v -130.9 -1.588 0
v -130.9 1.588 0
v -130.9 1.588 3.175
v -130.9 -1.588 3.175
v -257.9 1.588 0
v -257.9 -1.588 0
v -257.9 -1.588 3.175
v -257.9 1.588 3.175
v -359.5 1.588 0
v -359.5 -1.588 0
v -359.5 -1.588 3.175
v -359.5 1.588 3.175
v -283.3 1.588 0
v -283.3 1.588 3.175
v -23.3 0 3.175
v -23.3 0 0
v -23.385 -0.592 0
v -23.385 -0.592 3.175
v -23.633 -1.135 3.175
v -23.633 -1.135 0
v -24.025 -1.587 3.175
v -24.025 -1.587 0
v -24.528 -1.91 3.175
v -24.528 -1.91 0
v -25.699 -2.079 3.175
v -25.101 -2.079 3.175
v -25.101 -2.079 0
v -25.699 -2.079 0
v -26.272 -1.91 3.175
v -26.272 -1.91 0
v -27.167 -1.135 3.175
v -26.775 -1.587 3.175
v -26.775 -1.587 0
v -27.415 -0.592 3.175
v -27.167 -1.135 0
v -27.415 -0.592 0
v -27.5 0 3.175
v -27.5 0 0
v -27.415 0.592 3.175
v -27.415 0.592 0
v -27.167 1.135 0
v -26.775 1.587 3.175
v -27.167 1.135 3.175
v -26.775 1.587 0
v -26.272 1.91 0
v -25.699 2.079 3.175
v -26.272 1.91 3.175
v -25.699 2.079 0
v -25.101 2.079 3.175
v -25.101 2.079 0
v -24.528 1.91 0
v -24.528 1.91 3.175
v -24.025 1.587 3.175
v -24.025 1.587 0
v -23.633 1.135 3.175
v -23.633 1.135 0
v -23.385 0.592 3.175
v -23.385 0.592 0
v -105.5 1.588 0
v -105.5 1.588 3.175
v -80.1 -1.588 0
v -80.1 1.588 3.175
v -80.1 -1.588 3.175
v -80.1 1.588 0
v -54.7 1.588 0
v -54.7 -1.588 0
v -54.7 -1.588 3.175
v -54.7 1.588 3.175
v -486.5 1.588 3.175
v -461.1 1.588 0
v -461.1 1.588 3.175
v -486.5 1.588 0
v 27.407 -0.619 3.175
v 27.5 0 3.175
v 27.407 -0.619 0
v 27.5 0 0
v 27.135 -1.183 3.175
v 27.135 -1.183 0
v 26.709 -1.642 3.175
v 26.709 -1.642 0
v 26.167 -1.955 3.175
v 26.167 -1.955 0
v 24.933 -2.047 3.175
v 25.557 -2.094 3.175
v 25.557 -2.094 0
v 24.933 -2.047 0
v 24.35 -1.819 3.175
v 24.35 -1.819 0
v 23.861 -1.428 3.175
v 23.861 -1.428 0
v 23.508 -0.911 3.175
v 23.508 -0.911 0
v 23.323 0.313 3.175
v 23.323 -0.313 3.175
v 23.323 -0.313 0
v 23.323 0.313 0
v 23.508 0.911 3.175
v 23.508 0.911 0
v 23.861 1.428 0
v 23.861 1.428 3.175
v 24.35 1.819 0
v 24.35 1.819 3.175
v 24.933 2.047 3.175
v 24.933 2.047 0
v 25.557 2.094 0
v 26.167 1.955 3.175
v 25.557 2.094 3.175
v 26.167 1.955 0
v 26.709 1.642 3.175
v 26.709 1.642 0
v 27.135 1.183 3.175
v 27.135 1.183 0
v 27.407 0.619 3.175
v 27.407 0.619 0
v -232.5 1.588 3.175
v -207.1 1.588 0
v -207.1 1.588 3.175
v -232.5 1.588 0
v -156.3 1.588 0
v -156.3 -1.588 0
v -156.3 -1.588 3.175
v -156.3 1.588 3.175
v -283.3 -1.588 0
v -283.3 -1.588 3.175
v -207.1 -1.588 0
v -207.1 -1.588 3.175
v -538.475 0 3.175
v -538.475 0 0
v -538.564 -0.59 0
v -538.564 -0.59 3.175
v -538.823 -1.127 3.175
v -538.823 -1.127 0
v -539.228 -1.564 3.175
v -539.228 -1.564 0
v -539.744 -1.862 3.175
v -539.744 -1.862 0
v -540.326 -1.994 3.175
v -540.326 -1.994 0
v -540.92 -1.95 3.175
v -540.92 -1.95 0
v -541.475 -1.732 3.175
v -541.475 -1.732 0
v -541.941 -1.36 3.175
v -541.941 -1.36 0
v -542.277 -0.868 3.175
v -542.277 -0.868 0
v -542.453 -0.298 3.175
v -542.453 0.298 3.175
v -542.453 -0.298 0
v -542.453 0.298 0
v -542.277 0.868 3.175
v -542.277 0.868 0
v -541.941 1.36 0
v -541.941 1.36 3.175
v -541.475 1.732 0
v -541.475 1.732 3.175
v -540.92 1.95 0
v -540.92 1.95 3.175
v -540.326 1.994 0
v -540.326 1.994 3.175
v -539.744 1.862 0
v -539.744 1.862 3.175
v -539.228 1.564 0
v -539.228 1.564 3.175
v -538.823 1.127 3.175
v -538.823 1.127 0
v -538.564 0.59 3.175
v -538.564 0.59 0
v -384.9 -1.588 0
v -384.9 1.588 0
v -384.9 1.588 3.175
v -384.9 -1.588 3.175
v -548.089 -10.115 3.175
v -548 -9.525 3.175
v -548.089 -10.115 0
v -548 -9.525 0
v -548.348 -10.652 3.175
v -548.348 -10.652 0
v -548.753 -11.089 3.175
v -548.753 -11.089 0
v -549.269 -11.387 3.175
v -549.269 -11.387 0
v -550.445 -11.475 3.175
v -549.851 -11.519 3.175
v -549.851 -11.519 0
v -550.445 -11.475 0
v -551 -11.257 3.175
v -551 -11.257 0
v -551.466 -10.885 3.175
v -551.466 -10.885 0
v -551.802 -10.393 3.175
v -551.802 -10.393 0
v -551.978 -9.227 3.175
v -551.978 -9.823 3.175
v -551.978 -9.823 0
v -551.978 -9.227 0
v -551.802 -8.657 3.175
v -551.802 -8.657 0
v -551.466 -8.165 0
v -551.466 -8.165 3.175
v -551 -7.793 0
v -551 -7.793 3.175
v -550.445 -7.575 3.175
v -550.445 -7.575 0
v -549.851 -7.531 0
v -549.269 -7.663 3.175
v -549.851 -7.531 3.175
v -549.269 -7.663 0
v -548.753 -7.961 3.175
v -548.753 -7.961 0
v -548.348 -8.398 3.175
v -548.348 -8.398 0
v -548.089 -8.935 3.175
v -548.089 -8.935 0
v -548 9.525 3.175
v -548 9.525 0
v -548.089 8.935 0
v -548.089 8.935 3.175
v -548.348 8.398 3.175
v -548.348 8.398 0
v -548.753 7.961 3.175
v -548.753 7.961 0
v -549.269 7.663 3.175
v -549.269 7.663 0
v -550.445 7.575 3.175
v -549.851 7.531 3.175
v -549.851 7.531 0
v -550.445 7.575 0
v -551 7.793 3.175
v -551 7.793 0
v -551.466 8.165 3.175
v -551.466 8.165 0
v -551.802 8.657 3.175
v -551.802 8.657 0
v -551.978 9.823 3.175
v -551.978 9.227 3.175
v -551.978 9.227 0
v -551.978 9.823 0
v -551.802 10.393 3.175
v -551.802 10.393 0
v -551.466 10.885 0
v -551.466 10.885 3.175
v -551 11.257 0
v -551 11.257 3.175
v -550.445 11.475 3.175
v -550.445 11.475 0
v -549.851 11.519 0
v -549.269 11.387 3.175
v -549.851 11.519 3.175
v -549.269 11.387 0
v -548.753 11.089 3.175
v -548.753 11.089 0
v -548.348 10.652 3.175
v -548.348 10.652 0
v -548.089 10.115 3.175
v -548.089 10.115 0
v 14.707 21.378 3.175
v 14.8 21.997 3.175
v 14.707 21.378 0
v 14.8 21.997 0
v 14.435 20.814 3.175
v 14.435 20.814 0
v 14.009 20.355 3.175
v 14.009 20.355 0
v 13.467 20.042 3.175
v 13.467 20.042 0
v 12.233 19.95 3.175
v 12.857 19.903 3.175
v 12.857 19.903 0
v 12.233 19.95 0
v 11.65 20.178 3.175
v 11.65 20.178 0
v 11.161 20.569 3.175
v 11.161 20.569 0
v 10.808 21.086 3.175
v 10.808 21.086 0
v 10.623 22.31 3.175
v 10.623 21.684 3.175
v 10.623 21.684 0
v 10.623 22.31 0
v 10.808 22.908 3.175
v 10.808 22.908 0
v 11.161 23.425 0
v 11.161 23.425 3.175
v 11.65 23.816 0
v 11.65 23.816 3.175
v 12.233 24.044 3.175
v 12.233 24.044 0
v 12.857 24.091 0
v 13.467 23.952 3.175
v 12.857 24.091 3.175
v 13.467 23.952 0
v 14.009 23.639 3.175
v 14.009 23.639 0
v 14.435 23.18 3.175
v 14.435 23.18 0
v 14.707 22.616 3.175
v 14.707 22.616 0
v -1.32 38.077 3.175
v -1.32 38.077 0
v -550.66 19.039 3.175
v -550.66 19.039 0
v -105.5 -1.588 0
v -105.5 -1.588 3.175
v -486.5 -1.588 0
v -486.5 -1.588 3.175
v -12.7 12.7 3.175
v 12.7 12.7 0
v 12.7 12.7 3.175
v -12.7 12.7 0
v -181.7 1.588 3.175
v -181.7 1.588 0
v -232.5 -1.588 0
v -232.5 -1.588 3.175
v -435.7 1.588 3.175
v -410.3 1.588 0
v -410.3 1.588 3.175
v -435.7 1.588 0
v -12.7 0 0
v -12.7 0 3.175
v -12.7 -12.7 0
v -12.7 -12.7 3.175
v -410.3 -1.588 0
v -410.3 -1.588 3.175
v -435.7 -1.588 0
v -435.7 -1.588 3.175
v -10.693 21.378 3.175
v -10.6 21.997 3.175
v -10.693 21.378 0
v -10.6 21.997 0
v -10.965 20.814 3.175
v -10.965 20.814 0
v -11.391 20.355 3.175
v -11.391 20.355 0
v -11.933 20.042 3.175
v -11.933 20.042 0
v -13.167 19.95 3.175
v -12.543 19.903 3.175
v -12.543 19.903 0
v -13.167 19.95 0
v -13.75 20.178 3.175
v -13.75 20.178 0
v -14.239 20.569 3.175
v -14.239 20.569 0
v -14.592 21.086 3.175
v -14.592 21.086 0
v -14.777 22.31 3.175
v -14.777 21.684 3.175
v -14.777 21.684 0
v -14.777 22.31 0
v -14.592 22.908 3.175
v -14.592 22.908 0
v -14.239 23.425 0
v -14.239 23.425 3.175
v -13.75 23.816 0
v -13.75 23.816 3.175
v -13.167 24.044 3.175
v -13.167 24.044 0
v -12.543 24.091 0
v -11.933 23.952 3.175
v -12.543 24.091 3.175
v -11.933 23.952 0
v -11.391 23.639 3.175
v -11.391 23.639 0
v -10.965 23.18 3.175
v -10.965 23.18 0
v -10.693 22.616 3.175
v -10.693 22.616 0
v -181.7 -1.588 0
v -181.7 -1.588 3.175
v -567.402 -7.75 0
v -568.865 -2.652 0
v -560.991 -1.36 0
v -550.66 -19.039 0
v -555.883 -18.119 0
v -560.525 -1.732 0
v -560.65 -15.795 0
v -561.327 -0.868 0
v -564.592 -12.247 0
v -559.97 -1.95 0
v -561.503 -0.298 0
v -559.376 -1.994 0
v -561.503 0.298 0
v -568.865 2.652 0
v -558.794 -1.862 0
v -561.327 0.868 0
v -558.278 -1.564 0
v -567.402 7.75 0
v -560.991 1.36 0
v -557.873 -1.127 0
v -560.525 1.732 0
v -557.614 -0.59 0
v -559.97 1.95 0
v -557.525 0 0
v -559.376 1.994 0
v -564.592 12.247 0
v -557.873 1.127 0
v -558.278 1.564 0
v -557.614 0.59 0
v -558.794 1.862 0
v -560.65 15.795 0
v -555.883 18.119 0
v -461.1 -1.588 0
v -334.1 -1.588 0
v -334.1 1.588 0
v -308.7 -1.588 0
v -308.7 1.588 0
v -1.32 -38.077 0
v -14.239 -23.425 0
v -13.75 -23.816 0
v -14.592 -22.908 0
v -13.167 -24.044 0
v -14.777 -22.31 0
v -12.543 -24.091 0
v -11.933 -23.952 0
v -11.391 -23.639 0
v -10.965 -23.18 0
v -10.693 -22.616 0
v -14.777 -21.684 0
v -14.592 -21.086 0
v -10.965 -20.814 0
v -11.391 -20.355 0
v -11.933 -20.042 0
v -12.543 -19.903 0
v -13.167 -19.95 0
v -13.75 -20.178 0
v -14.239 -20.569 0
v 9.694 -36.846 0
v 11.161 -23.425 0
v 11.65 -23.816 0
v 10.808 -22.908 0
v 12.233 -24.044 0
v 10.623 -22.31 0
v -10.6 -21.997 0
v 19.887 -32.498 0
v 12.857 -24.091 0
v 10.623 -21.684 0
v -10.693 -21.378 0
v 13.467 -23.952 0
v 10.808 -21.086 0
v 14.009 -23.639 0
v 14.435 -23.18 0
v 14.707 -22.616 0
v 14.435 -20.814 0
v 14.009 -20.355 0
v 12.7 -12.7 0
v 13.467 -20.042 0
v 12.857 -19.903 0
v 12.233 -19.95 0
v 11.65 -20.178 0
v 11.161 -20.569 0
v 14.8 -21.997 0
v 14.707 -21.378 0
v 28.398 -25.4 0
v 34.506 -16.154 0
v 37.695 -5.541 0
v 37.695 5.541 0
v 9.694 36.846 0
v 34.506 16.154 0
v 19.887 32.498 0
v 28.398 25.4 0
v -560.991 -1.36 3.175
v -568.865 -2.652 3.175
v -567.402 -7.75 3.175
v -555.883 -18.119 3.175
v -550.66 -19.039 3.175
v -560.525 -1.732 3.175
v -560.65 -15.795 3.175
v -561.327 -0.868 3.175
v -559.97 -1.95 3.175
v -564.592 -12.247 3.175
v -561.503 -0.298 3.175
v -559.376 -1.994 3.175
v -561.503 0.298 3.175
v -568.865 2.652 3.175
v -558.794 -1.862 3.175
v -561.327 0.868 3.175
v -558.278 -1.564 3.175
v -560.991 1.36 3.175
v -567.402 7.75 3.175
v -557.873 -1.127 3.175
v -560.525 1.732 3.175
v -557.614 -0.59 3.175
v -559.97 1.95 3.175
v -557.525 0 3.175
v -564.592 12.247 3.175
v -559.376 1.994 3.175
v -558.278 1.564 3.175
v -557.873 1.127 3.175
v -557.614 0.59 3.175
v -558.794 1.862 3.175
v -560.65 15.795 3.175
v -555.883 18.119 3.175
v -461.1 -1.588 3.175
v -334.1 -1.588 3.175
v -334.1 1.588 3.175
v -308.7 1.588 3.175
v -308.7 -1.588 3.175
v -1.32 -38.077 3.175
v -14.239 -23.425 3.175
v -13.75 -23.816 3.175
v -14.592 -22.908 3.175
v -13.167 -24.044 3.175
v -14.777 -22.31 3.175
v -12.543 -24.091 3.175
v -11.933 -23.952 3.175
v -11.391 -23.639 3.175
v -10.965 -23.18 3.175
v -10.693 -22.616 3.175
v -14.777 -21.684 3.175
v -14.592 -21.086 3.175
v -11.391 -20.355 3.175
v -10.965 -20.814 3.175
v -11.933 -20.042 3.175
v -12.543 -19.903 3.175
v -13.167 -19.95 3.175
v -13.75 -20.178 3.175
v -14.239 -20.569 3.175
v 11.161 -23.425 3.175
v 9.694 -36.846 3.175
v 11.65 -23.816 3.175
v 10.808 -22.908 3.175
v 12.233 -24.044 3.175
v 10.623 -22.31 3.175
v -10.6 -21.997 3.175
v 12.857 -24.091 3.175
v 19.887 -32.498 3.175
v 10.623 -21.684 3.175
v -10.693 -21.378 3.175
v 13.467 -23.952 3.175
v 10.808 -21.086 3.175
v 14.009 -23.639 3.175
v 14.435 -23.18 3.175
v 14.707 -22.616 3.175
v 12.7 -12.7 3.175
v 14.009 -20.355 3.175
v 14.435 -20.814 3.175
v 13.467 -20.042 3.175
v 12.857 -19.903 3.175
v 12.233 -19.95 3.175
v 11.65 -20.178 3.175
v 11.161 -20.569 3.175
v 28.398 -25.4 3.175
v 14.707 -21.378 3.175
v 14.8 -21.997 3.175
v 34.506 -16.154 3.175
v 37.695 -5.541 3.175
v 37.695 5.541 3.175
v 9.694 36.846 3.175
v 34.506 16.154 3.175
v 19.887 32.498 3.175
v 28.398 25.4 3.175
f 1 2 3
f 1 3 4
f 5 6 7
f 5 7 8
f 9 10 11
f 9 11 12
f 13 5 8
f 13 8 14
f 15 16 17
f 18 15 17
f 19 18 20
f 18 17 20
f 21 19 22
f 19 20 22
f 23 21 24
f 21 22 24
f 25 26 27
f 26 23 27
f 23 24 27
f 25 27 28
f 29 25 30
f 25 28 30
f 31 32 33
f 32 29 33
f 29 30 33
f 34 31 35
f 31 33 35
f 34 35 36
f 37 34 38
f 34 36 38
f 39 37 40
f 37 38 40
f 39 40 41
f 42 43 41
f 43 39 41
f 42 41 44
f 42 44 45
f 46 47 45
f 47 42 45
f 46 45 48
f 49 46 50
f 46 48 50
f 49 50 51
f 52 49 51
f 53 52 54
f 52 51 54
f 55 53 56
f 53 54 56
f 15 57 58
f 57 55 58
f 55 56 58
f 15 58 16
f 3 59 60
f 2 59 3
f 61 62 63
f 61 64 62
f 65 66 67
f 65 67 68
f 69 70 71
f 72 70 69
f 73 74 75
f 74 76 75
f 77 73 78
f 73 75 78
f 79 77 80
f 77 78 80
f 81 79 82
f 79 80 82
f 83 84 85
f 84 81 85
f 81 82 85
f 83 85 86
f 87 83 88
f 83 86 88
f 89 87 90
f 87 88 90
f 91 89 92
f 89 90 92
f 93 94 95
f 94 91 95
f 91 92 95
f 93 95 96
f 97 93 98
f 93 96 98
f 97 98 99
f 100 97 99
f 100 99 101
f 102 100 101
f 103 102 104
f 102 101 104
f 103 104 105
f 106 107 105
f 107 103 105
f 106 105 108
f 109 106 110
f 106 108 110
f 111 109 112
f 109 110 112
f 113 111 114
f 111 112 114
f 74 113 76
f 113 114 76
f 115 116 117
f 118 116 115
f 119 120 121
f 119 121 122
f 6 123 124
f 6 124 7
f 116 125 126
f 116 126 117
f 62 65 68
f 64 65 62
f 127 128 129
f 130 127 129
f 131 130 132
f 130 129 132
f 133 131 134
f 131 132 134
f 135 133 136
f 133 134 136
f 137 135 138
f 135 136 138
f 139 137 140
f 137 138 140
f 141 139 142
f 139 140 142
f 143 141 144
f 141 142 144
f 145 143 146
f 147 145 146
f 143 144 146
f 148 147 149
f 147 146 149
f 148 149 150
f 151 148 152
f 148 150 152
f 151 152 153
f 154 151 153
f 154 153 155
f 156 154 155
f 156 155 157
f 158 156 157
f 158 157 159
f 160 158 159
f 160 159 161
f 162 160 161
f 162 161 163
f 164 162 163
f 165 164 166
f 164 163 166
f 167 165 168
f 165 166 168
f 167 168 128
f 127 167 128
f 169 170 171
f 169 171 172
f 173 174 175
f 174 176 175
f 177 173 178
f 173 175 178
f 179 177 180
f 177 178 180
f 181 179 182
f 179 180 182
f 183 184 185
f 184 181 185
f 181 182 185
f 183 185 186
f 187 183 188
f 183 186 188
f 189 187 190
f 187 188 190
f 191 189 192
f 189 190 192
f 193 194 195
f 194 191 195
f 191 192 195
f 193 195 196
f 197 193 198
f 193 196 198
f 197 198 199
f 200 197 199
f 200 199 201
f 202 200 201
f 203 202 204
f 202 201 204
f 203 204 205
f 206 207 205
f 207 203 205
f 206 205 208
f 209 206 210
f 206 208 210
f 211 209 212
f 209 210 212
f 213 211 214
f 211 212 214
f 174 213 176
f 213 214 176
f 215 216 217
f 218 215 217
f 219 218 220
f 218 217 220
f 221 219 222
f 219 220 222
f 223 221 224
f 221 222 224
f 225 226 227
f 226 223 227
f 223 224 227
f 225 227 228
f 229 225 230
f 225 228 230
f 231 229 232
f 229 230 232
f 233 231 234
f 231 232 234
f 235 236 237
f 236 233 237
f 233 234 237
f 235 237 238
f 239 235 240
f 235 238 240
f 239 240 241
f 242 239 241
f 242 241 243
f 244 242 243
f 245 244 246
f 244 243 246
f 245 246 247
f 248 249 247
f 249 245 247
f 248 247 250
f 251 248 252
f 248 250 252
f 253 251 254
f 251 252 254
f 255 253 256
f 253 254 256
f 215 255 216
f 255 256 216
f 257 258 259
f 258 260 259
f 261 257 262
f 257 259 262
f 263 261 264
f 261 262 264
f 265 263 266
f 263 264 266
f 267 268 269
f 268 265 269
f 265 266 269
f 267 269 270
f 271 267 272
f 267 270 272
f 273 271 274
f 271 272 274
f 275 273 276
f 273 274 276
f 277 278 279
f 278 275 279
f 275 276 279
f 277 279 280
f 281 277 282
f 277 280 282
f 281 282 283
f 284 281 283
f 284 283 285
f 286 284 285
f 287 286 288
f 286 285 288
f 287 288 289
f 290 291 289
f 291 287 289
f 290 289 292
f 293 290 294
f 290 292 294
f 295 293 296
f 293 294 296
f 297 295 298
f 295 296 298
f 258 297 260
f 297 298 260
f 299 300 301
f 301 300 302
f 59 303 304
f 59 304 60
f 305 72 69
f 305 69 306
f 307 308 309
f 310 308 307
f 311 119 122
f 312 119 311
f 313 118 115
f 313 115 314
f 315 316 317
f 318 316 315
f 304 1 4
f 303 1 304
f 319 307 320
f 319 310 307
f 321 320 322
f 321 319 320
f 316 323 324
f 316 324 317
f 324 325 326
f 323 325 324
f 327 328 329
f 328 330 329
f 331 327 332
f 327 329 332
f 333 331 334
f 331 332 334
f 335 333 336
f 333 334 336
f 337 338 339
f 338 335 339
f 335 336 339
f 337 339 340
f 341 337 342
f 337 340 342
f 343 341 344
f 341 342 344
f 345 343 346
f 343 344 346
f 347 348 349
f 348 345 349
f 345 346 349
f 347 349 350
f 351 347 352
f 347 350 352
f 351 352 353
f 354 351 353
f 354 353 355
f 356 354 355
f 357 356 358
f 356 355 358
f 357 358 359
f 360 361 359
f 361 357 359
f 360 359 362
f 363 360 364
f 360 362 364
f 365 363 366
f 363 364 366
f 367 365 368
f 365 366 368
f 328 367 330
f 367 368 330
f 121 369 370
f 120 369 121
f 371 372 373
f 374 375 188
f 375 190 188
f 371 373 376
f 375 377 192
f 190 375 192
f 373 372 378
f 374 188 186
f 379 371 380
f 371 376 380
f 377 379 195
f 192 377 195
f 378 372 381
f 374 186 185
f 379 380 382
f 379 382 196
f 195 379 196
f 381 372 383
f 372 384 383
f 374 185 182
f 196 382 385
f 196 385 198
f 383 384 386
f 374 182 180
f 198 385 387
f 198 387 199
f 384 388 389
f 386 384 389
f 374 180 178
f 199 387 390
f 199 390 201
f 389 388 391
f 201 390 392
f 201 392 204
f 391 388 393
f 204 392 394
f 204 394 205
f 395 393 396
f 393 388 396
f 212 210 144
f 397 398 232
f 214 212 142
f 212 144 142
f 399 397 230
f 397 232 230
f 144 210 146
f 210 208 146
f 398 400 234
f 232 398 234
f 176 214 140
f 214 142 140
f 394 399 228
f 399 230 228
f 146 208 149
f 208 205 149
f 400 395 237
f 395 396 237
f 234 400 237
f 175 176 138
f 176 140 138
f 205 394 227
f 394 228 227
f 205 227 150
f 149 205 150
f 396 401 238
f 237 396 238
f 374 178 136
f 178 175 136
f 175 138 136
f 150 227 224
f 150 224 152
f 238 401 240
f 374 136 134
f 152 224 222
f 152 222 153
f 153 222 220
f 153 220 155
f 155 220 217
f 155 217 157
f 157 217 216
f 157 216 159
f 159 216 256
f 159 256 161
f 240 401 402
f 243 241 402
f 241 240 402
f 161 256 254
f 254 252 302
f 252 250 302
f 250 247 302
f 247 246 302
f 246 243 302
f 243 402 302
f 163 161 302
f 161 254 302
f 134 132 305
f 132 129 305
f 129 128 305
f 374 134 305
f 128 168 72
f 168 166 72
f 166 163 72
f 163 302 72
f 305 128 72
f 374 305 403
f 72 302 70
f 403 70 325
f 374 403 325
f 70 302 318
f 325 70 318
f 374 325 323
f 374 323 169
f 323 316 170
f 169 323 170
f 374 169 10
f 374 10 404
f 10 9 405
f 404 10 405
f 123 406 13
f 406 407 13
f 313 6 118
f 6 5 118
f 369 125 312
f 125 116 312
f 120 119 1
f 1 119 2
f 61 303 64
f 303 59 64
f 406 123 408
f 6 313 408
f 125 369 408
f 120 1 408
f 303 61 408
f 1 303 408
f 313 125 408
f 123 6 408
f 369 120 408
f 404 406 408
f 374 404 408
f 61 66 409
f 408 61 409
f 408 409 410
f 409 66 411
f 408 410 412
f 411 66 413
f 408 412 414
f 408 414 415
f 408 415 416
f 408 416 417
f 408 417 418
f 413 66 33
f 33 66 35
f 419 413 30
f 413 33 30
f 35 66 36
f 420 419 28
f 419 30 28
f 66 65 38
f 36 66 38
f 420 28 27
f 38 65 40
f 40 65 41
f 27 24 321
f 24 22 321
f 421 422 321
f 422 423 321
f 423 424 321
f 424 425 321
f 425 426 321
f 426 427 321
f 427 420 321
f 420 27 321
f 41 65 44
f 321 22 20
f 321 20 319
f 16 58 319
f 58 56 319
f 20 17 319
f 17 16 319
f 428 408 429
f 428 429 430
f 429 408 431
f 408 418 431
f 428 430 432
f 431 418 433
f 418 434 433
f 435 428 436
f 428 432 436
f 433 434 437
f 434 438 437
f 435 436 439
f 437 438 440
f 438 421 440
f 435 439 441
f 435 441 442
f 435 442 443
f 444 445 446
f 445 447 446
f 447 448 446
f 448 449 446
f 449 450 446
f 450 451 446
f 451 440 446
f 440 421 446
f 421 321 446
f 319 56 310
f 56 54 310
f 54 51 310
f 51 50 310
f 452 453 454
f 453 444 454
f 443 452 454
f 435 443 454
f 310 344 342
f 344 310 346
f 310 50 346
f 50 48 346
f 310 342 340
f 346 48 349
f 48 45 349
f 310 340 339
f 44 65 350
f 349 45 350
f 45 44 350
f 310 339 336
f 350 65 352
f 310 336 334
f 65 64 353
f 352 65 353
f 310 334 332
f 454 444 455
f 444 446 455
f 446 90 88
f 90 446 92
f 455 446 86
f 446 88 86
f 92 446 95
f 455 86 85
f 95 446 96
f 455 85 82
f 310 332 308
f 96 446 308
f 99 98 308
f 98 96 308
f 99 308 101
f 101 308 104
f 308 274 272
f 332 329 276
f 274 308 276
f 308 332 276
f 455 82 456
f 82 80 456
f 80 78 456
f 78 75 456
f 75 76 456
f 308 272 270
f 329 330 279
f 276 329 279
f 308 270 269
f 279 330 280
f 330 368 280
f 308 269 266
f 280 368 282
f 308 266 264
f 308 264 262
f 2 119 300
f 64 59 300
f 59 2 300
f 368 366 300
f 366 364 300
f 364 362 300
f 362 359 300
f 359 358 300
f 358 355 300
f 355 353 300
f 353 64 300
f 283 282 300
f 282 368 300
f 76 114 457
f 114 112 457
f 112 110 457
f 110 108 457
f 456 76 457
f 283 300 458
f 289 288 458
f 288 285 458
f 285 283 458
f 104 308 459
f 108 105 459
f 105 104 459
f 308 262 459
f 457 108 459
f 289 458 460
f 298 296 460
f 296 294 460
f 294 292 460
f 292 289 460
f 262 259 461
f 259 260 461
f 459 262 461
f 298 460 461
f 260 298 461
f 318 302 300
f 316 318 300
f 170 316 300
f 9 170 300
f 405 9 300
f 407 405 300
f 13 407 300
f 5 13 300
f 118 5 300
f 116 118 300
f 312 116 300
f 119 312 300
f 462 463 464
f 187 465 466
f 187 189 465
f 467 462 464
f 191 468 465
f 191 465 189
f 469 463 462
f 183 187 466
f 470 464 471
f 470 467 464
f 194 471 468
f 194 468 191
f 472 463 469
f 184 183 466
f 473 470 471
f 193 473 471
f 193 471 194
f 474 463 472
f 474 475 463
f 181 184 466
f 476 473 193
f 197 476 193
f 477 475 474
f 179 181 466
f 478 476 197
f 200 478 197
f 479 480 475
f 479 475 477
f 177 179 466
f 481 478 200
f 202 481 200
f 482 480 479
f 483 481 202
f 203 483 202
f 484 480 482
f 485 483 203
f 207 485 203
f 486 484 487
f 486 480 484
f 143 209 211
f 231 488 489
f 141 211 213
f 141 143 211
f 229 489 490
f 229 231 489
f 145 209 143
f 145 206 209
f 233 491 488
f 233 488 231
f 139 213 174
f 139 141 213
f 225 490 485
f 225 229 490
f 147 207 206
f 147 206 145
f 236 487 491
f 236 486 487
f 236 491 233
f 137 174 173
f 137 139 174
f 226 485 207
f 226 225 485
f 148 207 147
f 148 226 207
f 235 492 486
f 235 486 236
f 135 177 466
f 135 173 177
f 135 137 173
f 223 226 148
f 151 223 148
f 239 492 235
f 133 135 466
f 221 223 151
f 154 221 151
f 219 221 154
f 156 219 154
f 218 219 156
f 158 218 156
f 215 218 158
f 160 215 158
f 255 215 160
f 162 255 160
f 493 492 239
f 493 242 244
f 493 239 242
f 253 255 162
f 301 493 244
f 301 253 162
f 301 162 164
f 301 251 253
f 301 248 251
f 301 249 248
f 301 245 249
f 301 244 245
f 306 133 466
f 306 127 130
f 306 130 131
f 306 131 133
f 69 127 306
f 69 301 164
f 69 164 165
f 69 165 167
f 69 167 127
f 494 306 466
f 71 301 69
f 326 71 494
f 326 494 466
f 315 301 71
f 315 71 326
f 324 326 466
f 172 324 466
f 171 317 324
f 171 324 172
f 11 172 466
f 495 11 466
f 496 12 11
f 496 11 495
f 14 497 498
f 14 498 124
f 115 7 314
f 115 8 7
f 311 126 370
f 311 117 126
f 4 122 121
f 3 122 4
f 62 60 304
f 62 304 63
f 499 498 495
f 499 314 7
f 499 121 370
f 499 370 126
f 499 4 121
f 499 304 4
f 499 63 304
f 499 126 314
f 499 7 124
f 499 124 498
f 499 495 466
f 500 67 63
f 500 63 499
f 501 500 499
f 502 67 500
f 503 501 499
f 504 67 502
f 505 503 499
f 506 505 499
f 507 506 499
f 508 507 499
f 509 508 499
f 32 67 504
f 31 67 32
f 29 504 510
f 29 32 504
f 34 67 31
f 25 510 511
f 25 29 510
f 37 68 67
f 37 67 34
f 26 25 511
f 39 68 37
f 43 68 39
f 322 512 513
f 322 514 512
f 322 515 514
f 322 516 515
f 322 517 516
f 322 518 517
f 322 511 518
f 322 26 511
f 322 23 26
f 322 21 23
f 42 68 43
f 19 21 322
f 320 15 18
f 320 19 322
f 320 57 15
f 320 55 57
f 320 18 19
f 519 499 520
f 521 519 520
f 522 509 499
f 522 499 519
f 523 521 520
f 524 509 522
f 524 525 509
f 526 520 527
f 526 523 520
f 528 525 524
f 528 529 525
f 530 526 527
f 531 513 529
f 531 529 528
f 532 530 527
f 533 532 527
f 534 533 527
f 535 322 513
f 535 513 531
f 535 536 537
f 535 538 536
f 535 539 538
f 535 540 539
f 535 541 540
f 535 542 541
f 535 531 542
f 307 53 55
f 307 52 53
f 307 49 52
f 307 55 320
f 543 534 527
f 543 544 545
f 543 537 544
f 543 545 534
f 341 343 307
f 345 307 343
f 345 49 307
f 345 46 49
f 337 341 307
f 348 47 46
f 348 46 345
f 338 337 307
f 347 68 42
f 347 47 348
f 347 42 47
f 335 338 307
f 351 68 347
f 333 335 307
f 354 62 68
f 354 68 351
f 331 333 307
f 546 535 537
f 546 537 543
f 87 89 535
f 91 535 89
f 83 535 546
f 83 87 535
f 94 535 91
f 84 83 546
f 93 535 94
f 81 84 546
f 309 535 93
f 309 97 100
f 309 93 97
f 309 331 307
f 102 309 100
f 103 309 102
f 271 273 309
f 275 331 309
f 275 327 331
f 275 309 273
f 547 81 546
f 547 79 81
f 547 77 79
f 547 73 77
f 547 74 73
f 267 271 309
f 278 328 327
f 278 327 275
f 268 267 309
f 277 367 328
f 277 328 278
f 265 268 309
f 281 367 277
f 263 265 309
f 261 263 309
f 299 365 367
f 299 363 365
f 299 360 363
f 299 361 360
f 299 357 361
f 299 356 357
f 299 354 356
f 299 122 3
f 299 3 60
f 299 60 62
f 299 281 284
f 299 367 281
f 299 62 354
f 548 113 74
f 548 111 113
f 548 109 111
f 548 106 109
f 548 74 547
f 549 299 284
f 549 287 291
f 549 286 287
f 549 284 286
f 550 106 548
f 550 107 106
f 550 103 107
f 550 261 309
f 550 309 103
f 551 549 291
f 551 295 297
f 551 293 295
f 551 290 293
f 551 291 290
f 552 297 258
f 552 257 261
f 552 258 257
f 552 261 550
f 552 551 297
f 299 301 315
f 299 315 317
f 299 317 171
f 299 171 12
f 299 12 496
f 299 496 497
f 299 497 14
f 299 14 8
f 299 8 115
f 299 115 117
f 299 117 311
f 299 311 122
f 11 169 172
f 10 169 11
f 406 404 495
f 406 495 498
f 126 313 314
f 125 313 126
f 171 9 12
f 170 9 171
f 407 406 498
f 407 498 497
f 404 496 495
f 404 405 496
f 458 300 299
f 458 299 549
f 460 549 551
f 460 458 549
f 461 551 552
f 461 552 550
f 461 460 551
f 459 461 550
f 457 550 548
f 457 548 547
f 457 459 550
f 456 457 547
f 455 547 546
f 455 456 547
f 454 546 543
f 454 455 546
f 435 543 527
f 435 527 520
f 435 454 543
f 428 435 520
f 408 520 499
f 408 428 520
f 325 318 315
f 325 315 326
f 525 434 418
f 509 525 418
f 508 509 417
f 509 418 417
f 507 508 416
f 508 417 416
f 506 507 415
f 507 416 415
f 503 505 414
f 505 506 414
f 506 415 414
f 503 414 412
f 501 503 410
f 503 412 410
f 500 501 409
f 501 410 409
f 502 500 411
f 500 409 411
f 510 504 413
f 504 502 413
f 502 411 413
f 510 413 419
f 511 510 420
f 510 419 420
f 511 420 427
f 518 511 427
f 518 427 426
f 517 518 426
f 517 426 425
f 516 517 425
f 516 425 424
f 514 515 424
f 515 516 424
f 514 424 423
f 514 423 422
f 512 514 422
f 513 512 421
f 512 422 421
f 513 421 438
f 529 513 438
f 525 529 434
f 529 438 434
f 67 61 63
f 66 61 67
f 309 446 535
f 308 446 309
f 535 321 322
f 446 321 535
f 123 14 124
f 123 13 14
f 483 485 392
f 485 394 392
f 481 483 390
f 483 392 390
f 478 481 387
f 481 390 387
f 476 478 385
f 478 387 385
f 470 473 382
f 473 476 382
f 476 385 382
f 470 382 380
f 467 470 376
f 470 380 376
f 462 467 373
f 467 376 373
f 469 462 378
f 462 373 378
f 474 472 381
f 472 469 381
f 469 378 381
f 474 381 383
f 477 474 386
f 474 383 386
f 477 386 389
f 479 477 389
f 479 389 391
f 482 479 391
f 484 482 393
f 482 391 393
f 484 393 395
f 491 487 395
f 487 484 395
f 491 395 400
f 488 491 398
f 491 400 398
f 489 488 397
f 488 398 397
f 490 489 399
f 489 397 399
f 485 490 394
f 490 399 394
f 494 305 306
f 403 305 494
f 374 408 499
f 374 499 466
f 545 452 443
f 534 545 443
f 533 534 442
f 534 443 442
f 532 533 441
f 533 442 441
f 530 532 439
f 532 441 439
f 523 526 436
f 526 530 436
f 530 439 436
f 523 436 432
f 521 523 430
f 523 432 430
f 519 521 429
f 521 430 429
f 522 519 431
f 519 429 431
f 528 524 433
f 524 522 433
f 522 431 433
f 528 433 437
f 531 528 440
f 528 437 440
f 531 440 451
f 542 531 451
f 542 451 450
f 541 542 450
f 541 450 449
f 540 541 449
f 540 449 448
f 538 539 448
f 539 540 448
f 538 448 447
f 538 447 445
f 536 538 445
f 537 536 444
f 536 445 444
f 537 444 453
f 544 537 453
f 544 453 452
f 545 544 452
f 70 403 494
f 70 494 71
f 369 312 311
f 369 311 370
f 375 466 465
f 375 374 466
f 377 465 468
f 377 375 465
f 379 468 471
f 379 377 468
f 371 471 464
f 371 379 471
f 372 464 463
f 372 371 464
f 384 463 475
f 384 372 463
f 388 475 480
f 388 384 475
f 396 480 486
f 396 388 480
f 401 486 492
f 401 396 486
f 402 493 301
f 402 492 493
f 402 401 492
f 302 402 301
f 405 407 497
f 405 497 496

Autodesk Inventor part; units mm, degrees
ref_plane "YZ Plane" through (0, 0, 0) normal (1, 0, 0) x (0, 1, 0)
ref_plane "XZ Plane" through (0, 0, 0) normal (0, 1, 0) x (-1, 0, 0)
ref_plane "XY Plane" through (0, 0, 0) normal (0, 0, 1) x (1, 0, 0)
sketch "Sketch1" plane through (0, 0, 0) normal (0, 0, 1) x (1, 0, 0)
  circle A0 centre (0, 0) radius 31.75 projected
  circle A1 centre (25.4, 0) radius 2.1 projected
  circle A2 centre (-25.4, 0) radius 2.1 projected
  circle A3 centre (12.7, -21.997) radius 2.1 projected
  circle A4 centre (-12.7, -21.997) radius 2.1 projected
  line L0 (12.7, -12.7) -> (12.7, 12.7) projected
  line L1 (-12.7, -12.7) -> (12.7, -12.7) projected
  line L2 (-12.7, 12.7) -> (-12.7, -12.7) projected
  line L3 (12.7, 12.7) -> (-12.7, 12.7) projected
  circle A5 centre (12.7, 21.997) radius 2.1 projected
  circle A6 centre (-12.7, 21.997) radius 2.1 projected
  circle A7 centre (0, 0) radius 38.1
  line L4 (0, 0) -> (-550, 0)
  circle A8 centre (-550, 0) radius 19.05
  circle A9 centre (-540.475, 0) radius 2
  circle A10 centre (-550, 9.525) radius 2
  circle A11 centre (-559.525, 0) radius 2
  circle A12 centre (-550, -9.525) radius 2
  line L5 (-1.3196, 38.0771) -> (-550.6598, 19.0386)
  line L6 (-1.3196, -38.0771) -> (-550.6598, -19.0386)
  circle A13 centre (12.7, 21.997) radius 2
  circle A14 centre (-12.7, 21.997) radius 2
  circle A15 centre (25.4, 0) radius 2
  circle A16 centre (-25.4, 0) radius 2
  circle A17 centre (12.7, -21.997) radius 2
  circle A18 centre (-12.7, -21.997) radius 2
  line L7 (-486.5, -1.5875) -> (-461.1, -1.5875)
  line L8 (-461.1, -1.5875) -> (-461.1, 1.5875)
  line L9 (-461.1, 1.5875) -> (-486.5, 1.5875)
  line L10 (-486.5, 1.5875) -> (-486.5, -1.5875)
  line L11 (-410.3, -1.5875) -> (-410.3, 1.5875)
  line L12 (-435.7, -1.5875) -> (-410.3, -1.5875)
  line L13 (-410.3, 1.5875) -> (-435.7, 1.5875)
  line L14 (-435.7, 1.5875) -> (-435.7, -1.5875)
  line L15 (-359.5, -1.5875) -> (-359.5, 1.5875)
  line L16 (-384.9, -1.5875) -> (-359.5, -1.5875)
  line L17 (-359.5, 1.5875) -> (-384.9, 1.5875)
  line L18 (-384.9, 1.5875) -> (-384.9, -1.5875)
  line L19 (-308.7, -1.5875) -> (-308.7, 1.5875)
  line L20 (-334.1, -1.5875) -> (-308.7, -1.5875)
  line L21 (-308.7, 1.5875) -> (-334.1, 1.5875)
  line L22 (-334.1, 1.5875) -> (-334.1, -1.5875)
  line L23 (-257.9, -1.5875) -> (-257.9, 1.5875)
  line L24 (-283.3, -1.5875) -> (-257.9, -1.5875)
  line L25 (-257.9, 1.5875) -> (-283.3, 1.5875)
  line L26 (-283.3, 1.5875) -> (-283.3, -1.5875)
  line L27 (-207.1, -1.5875) -> (-207.1, 1.5875)
  line L28 (-232.5, -1.5875) -> (-207.1, -1.5875)
  line L29 (-207.1, 1.5875) -> (-232.5, 1.5875)
  line L30 (-232.5, 1.5875) -> (-232.5, -1.5875)
  line L31 (-156.3, -1.5875) -> (-156.3, 1.5875)
  line L32 (-181.7, -1.5875) -> (-156.3, -1.5875)
  line L33 (-156.3, 1.5875) -> (-181.7, 1.5875)
  line L34 (-181.7, 1.5875) -> (-181.7, -1.5875)
  line L35 (-105.5, -1.5875) -> (-105.5, 1.5875)
  line L36 (-130.9, -1.5875) -> (-105.5, -1.5875)
  line L37 (-105.5, 1.5875) -> (-130.9, 1.5875)
  line L38 (-130.9, 1.5875) -> (-130.9, -1.5875)
  line L39 (-54.7, -1.5875) -> (-54.7, 1.5875)
  line L40 (-80.1, -1.5875) -> (-54.7, -1.5875)
  line L41 (-54.7, 1.5875) -> (-80.1, 1.5875)
  line L42 (-80.1, 1.5875) -> (-80.1, -1.5875)
  point P0 (-486.5, 0)
  point P1 (-473.8, -1.5875)
  point P2 (-423, -1.5875)
  point P3 (-435.7, 0)
  point P4 (-372.2, -1.5875)
  point P5 (-384.9, 0)
  point P6 (-321.4, -1.5875)
  point P7 (-334.1, 0)
  point P8 (-270.6, -1.5875)
  point P9 (-283.3, 0)
  point P10 (-219.8, -1.5875)
  point P11 (-232.5, 0)
  point P12 (-169, -1.5875)
  point P13 (-181.7, 0)
  point P14 (-118.2, -1.5875)
  point P15 (-130.9, 0)
  point P16 (-67.4, -1.5875)
  point P17 (-80.1, 0)
  dimension "d0" = 76.2
  dimension "d1" = 550
  dimension "d2" = 38.1
  dimension "d3" = 4
  dimension "d4" = 9.525
  dimension "d7" = 360
  dimension "d9" = 4
  dimension "d10" = 4
  dimension "d11" = 4
  dimension "d12" = 4
  dimension "d13" = 4
  dimension "d14" = 4
  dimension "d17" = 25.4
  dimension "d18" = 3.175
  dimension "d19" = 76.2
  dimension "d22" = 50.8
extrude "Extrusion1" add sketch "Sketch1" along normal blind 3.175 contours A0 | A7 | A7 L6 A8 L4 L10 L7 L8 L14 L12 L11 L18 L16 L15 L22 L20 L19 L26 L24 L23 L30 L28 L27 L34 L32 L31 L38 L36 L35 L42 L40 L39 | L4 L39 L41 L42 L35 L37 L38 L31 L33 L34 L27 L29 L30 L23 L25 L26 L19 L21 L22 L15 L17 L18 L11 L13 L14 L8 L9 L10 A8 L5 A7 | A8
properties part number "MainArm" material "MDF Medium Density Fiberboard"
